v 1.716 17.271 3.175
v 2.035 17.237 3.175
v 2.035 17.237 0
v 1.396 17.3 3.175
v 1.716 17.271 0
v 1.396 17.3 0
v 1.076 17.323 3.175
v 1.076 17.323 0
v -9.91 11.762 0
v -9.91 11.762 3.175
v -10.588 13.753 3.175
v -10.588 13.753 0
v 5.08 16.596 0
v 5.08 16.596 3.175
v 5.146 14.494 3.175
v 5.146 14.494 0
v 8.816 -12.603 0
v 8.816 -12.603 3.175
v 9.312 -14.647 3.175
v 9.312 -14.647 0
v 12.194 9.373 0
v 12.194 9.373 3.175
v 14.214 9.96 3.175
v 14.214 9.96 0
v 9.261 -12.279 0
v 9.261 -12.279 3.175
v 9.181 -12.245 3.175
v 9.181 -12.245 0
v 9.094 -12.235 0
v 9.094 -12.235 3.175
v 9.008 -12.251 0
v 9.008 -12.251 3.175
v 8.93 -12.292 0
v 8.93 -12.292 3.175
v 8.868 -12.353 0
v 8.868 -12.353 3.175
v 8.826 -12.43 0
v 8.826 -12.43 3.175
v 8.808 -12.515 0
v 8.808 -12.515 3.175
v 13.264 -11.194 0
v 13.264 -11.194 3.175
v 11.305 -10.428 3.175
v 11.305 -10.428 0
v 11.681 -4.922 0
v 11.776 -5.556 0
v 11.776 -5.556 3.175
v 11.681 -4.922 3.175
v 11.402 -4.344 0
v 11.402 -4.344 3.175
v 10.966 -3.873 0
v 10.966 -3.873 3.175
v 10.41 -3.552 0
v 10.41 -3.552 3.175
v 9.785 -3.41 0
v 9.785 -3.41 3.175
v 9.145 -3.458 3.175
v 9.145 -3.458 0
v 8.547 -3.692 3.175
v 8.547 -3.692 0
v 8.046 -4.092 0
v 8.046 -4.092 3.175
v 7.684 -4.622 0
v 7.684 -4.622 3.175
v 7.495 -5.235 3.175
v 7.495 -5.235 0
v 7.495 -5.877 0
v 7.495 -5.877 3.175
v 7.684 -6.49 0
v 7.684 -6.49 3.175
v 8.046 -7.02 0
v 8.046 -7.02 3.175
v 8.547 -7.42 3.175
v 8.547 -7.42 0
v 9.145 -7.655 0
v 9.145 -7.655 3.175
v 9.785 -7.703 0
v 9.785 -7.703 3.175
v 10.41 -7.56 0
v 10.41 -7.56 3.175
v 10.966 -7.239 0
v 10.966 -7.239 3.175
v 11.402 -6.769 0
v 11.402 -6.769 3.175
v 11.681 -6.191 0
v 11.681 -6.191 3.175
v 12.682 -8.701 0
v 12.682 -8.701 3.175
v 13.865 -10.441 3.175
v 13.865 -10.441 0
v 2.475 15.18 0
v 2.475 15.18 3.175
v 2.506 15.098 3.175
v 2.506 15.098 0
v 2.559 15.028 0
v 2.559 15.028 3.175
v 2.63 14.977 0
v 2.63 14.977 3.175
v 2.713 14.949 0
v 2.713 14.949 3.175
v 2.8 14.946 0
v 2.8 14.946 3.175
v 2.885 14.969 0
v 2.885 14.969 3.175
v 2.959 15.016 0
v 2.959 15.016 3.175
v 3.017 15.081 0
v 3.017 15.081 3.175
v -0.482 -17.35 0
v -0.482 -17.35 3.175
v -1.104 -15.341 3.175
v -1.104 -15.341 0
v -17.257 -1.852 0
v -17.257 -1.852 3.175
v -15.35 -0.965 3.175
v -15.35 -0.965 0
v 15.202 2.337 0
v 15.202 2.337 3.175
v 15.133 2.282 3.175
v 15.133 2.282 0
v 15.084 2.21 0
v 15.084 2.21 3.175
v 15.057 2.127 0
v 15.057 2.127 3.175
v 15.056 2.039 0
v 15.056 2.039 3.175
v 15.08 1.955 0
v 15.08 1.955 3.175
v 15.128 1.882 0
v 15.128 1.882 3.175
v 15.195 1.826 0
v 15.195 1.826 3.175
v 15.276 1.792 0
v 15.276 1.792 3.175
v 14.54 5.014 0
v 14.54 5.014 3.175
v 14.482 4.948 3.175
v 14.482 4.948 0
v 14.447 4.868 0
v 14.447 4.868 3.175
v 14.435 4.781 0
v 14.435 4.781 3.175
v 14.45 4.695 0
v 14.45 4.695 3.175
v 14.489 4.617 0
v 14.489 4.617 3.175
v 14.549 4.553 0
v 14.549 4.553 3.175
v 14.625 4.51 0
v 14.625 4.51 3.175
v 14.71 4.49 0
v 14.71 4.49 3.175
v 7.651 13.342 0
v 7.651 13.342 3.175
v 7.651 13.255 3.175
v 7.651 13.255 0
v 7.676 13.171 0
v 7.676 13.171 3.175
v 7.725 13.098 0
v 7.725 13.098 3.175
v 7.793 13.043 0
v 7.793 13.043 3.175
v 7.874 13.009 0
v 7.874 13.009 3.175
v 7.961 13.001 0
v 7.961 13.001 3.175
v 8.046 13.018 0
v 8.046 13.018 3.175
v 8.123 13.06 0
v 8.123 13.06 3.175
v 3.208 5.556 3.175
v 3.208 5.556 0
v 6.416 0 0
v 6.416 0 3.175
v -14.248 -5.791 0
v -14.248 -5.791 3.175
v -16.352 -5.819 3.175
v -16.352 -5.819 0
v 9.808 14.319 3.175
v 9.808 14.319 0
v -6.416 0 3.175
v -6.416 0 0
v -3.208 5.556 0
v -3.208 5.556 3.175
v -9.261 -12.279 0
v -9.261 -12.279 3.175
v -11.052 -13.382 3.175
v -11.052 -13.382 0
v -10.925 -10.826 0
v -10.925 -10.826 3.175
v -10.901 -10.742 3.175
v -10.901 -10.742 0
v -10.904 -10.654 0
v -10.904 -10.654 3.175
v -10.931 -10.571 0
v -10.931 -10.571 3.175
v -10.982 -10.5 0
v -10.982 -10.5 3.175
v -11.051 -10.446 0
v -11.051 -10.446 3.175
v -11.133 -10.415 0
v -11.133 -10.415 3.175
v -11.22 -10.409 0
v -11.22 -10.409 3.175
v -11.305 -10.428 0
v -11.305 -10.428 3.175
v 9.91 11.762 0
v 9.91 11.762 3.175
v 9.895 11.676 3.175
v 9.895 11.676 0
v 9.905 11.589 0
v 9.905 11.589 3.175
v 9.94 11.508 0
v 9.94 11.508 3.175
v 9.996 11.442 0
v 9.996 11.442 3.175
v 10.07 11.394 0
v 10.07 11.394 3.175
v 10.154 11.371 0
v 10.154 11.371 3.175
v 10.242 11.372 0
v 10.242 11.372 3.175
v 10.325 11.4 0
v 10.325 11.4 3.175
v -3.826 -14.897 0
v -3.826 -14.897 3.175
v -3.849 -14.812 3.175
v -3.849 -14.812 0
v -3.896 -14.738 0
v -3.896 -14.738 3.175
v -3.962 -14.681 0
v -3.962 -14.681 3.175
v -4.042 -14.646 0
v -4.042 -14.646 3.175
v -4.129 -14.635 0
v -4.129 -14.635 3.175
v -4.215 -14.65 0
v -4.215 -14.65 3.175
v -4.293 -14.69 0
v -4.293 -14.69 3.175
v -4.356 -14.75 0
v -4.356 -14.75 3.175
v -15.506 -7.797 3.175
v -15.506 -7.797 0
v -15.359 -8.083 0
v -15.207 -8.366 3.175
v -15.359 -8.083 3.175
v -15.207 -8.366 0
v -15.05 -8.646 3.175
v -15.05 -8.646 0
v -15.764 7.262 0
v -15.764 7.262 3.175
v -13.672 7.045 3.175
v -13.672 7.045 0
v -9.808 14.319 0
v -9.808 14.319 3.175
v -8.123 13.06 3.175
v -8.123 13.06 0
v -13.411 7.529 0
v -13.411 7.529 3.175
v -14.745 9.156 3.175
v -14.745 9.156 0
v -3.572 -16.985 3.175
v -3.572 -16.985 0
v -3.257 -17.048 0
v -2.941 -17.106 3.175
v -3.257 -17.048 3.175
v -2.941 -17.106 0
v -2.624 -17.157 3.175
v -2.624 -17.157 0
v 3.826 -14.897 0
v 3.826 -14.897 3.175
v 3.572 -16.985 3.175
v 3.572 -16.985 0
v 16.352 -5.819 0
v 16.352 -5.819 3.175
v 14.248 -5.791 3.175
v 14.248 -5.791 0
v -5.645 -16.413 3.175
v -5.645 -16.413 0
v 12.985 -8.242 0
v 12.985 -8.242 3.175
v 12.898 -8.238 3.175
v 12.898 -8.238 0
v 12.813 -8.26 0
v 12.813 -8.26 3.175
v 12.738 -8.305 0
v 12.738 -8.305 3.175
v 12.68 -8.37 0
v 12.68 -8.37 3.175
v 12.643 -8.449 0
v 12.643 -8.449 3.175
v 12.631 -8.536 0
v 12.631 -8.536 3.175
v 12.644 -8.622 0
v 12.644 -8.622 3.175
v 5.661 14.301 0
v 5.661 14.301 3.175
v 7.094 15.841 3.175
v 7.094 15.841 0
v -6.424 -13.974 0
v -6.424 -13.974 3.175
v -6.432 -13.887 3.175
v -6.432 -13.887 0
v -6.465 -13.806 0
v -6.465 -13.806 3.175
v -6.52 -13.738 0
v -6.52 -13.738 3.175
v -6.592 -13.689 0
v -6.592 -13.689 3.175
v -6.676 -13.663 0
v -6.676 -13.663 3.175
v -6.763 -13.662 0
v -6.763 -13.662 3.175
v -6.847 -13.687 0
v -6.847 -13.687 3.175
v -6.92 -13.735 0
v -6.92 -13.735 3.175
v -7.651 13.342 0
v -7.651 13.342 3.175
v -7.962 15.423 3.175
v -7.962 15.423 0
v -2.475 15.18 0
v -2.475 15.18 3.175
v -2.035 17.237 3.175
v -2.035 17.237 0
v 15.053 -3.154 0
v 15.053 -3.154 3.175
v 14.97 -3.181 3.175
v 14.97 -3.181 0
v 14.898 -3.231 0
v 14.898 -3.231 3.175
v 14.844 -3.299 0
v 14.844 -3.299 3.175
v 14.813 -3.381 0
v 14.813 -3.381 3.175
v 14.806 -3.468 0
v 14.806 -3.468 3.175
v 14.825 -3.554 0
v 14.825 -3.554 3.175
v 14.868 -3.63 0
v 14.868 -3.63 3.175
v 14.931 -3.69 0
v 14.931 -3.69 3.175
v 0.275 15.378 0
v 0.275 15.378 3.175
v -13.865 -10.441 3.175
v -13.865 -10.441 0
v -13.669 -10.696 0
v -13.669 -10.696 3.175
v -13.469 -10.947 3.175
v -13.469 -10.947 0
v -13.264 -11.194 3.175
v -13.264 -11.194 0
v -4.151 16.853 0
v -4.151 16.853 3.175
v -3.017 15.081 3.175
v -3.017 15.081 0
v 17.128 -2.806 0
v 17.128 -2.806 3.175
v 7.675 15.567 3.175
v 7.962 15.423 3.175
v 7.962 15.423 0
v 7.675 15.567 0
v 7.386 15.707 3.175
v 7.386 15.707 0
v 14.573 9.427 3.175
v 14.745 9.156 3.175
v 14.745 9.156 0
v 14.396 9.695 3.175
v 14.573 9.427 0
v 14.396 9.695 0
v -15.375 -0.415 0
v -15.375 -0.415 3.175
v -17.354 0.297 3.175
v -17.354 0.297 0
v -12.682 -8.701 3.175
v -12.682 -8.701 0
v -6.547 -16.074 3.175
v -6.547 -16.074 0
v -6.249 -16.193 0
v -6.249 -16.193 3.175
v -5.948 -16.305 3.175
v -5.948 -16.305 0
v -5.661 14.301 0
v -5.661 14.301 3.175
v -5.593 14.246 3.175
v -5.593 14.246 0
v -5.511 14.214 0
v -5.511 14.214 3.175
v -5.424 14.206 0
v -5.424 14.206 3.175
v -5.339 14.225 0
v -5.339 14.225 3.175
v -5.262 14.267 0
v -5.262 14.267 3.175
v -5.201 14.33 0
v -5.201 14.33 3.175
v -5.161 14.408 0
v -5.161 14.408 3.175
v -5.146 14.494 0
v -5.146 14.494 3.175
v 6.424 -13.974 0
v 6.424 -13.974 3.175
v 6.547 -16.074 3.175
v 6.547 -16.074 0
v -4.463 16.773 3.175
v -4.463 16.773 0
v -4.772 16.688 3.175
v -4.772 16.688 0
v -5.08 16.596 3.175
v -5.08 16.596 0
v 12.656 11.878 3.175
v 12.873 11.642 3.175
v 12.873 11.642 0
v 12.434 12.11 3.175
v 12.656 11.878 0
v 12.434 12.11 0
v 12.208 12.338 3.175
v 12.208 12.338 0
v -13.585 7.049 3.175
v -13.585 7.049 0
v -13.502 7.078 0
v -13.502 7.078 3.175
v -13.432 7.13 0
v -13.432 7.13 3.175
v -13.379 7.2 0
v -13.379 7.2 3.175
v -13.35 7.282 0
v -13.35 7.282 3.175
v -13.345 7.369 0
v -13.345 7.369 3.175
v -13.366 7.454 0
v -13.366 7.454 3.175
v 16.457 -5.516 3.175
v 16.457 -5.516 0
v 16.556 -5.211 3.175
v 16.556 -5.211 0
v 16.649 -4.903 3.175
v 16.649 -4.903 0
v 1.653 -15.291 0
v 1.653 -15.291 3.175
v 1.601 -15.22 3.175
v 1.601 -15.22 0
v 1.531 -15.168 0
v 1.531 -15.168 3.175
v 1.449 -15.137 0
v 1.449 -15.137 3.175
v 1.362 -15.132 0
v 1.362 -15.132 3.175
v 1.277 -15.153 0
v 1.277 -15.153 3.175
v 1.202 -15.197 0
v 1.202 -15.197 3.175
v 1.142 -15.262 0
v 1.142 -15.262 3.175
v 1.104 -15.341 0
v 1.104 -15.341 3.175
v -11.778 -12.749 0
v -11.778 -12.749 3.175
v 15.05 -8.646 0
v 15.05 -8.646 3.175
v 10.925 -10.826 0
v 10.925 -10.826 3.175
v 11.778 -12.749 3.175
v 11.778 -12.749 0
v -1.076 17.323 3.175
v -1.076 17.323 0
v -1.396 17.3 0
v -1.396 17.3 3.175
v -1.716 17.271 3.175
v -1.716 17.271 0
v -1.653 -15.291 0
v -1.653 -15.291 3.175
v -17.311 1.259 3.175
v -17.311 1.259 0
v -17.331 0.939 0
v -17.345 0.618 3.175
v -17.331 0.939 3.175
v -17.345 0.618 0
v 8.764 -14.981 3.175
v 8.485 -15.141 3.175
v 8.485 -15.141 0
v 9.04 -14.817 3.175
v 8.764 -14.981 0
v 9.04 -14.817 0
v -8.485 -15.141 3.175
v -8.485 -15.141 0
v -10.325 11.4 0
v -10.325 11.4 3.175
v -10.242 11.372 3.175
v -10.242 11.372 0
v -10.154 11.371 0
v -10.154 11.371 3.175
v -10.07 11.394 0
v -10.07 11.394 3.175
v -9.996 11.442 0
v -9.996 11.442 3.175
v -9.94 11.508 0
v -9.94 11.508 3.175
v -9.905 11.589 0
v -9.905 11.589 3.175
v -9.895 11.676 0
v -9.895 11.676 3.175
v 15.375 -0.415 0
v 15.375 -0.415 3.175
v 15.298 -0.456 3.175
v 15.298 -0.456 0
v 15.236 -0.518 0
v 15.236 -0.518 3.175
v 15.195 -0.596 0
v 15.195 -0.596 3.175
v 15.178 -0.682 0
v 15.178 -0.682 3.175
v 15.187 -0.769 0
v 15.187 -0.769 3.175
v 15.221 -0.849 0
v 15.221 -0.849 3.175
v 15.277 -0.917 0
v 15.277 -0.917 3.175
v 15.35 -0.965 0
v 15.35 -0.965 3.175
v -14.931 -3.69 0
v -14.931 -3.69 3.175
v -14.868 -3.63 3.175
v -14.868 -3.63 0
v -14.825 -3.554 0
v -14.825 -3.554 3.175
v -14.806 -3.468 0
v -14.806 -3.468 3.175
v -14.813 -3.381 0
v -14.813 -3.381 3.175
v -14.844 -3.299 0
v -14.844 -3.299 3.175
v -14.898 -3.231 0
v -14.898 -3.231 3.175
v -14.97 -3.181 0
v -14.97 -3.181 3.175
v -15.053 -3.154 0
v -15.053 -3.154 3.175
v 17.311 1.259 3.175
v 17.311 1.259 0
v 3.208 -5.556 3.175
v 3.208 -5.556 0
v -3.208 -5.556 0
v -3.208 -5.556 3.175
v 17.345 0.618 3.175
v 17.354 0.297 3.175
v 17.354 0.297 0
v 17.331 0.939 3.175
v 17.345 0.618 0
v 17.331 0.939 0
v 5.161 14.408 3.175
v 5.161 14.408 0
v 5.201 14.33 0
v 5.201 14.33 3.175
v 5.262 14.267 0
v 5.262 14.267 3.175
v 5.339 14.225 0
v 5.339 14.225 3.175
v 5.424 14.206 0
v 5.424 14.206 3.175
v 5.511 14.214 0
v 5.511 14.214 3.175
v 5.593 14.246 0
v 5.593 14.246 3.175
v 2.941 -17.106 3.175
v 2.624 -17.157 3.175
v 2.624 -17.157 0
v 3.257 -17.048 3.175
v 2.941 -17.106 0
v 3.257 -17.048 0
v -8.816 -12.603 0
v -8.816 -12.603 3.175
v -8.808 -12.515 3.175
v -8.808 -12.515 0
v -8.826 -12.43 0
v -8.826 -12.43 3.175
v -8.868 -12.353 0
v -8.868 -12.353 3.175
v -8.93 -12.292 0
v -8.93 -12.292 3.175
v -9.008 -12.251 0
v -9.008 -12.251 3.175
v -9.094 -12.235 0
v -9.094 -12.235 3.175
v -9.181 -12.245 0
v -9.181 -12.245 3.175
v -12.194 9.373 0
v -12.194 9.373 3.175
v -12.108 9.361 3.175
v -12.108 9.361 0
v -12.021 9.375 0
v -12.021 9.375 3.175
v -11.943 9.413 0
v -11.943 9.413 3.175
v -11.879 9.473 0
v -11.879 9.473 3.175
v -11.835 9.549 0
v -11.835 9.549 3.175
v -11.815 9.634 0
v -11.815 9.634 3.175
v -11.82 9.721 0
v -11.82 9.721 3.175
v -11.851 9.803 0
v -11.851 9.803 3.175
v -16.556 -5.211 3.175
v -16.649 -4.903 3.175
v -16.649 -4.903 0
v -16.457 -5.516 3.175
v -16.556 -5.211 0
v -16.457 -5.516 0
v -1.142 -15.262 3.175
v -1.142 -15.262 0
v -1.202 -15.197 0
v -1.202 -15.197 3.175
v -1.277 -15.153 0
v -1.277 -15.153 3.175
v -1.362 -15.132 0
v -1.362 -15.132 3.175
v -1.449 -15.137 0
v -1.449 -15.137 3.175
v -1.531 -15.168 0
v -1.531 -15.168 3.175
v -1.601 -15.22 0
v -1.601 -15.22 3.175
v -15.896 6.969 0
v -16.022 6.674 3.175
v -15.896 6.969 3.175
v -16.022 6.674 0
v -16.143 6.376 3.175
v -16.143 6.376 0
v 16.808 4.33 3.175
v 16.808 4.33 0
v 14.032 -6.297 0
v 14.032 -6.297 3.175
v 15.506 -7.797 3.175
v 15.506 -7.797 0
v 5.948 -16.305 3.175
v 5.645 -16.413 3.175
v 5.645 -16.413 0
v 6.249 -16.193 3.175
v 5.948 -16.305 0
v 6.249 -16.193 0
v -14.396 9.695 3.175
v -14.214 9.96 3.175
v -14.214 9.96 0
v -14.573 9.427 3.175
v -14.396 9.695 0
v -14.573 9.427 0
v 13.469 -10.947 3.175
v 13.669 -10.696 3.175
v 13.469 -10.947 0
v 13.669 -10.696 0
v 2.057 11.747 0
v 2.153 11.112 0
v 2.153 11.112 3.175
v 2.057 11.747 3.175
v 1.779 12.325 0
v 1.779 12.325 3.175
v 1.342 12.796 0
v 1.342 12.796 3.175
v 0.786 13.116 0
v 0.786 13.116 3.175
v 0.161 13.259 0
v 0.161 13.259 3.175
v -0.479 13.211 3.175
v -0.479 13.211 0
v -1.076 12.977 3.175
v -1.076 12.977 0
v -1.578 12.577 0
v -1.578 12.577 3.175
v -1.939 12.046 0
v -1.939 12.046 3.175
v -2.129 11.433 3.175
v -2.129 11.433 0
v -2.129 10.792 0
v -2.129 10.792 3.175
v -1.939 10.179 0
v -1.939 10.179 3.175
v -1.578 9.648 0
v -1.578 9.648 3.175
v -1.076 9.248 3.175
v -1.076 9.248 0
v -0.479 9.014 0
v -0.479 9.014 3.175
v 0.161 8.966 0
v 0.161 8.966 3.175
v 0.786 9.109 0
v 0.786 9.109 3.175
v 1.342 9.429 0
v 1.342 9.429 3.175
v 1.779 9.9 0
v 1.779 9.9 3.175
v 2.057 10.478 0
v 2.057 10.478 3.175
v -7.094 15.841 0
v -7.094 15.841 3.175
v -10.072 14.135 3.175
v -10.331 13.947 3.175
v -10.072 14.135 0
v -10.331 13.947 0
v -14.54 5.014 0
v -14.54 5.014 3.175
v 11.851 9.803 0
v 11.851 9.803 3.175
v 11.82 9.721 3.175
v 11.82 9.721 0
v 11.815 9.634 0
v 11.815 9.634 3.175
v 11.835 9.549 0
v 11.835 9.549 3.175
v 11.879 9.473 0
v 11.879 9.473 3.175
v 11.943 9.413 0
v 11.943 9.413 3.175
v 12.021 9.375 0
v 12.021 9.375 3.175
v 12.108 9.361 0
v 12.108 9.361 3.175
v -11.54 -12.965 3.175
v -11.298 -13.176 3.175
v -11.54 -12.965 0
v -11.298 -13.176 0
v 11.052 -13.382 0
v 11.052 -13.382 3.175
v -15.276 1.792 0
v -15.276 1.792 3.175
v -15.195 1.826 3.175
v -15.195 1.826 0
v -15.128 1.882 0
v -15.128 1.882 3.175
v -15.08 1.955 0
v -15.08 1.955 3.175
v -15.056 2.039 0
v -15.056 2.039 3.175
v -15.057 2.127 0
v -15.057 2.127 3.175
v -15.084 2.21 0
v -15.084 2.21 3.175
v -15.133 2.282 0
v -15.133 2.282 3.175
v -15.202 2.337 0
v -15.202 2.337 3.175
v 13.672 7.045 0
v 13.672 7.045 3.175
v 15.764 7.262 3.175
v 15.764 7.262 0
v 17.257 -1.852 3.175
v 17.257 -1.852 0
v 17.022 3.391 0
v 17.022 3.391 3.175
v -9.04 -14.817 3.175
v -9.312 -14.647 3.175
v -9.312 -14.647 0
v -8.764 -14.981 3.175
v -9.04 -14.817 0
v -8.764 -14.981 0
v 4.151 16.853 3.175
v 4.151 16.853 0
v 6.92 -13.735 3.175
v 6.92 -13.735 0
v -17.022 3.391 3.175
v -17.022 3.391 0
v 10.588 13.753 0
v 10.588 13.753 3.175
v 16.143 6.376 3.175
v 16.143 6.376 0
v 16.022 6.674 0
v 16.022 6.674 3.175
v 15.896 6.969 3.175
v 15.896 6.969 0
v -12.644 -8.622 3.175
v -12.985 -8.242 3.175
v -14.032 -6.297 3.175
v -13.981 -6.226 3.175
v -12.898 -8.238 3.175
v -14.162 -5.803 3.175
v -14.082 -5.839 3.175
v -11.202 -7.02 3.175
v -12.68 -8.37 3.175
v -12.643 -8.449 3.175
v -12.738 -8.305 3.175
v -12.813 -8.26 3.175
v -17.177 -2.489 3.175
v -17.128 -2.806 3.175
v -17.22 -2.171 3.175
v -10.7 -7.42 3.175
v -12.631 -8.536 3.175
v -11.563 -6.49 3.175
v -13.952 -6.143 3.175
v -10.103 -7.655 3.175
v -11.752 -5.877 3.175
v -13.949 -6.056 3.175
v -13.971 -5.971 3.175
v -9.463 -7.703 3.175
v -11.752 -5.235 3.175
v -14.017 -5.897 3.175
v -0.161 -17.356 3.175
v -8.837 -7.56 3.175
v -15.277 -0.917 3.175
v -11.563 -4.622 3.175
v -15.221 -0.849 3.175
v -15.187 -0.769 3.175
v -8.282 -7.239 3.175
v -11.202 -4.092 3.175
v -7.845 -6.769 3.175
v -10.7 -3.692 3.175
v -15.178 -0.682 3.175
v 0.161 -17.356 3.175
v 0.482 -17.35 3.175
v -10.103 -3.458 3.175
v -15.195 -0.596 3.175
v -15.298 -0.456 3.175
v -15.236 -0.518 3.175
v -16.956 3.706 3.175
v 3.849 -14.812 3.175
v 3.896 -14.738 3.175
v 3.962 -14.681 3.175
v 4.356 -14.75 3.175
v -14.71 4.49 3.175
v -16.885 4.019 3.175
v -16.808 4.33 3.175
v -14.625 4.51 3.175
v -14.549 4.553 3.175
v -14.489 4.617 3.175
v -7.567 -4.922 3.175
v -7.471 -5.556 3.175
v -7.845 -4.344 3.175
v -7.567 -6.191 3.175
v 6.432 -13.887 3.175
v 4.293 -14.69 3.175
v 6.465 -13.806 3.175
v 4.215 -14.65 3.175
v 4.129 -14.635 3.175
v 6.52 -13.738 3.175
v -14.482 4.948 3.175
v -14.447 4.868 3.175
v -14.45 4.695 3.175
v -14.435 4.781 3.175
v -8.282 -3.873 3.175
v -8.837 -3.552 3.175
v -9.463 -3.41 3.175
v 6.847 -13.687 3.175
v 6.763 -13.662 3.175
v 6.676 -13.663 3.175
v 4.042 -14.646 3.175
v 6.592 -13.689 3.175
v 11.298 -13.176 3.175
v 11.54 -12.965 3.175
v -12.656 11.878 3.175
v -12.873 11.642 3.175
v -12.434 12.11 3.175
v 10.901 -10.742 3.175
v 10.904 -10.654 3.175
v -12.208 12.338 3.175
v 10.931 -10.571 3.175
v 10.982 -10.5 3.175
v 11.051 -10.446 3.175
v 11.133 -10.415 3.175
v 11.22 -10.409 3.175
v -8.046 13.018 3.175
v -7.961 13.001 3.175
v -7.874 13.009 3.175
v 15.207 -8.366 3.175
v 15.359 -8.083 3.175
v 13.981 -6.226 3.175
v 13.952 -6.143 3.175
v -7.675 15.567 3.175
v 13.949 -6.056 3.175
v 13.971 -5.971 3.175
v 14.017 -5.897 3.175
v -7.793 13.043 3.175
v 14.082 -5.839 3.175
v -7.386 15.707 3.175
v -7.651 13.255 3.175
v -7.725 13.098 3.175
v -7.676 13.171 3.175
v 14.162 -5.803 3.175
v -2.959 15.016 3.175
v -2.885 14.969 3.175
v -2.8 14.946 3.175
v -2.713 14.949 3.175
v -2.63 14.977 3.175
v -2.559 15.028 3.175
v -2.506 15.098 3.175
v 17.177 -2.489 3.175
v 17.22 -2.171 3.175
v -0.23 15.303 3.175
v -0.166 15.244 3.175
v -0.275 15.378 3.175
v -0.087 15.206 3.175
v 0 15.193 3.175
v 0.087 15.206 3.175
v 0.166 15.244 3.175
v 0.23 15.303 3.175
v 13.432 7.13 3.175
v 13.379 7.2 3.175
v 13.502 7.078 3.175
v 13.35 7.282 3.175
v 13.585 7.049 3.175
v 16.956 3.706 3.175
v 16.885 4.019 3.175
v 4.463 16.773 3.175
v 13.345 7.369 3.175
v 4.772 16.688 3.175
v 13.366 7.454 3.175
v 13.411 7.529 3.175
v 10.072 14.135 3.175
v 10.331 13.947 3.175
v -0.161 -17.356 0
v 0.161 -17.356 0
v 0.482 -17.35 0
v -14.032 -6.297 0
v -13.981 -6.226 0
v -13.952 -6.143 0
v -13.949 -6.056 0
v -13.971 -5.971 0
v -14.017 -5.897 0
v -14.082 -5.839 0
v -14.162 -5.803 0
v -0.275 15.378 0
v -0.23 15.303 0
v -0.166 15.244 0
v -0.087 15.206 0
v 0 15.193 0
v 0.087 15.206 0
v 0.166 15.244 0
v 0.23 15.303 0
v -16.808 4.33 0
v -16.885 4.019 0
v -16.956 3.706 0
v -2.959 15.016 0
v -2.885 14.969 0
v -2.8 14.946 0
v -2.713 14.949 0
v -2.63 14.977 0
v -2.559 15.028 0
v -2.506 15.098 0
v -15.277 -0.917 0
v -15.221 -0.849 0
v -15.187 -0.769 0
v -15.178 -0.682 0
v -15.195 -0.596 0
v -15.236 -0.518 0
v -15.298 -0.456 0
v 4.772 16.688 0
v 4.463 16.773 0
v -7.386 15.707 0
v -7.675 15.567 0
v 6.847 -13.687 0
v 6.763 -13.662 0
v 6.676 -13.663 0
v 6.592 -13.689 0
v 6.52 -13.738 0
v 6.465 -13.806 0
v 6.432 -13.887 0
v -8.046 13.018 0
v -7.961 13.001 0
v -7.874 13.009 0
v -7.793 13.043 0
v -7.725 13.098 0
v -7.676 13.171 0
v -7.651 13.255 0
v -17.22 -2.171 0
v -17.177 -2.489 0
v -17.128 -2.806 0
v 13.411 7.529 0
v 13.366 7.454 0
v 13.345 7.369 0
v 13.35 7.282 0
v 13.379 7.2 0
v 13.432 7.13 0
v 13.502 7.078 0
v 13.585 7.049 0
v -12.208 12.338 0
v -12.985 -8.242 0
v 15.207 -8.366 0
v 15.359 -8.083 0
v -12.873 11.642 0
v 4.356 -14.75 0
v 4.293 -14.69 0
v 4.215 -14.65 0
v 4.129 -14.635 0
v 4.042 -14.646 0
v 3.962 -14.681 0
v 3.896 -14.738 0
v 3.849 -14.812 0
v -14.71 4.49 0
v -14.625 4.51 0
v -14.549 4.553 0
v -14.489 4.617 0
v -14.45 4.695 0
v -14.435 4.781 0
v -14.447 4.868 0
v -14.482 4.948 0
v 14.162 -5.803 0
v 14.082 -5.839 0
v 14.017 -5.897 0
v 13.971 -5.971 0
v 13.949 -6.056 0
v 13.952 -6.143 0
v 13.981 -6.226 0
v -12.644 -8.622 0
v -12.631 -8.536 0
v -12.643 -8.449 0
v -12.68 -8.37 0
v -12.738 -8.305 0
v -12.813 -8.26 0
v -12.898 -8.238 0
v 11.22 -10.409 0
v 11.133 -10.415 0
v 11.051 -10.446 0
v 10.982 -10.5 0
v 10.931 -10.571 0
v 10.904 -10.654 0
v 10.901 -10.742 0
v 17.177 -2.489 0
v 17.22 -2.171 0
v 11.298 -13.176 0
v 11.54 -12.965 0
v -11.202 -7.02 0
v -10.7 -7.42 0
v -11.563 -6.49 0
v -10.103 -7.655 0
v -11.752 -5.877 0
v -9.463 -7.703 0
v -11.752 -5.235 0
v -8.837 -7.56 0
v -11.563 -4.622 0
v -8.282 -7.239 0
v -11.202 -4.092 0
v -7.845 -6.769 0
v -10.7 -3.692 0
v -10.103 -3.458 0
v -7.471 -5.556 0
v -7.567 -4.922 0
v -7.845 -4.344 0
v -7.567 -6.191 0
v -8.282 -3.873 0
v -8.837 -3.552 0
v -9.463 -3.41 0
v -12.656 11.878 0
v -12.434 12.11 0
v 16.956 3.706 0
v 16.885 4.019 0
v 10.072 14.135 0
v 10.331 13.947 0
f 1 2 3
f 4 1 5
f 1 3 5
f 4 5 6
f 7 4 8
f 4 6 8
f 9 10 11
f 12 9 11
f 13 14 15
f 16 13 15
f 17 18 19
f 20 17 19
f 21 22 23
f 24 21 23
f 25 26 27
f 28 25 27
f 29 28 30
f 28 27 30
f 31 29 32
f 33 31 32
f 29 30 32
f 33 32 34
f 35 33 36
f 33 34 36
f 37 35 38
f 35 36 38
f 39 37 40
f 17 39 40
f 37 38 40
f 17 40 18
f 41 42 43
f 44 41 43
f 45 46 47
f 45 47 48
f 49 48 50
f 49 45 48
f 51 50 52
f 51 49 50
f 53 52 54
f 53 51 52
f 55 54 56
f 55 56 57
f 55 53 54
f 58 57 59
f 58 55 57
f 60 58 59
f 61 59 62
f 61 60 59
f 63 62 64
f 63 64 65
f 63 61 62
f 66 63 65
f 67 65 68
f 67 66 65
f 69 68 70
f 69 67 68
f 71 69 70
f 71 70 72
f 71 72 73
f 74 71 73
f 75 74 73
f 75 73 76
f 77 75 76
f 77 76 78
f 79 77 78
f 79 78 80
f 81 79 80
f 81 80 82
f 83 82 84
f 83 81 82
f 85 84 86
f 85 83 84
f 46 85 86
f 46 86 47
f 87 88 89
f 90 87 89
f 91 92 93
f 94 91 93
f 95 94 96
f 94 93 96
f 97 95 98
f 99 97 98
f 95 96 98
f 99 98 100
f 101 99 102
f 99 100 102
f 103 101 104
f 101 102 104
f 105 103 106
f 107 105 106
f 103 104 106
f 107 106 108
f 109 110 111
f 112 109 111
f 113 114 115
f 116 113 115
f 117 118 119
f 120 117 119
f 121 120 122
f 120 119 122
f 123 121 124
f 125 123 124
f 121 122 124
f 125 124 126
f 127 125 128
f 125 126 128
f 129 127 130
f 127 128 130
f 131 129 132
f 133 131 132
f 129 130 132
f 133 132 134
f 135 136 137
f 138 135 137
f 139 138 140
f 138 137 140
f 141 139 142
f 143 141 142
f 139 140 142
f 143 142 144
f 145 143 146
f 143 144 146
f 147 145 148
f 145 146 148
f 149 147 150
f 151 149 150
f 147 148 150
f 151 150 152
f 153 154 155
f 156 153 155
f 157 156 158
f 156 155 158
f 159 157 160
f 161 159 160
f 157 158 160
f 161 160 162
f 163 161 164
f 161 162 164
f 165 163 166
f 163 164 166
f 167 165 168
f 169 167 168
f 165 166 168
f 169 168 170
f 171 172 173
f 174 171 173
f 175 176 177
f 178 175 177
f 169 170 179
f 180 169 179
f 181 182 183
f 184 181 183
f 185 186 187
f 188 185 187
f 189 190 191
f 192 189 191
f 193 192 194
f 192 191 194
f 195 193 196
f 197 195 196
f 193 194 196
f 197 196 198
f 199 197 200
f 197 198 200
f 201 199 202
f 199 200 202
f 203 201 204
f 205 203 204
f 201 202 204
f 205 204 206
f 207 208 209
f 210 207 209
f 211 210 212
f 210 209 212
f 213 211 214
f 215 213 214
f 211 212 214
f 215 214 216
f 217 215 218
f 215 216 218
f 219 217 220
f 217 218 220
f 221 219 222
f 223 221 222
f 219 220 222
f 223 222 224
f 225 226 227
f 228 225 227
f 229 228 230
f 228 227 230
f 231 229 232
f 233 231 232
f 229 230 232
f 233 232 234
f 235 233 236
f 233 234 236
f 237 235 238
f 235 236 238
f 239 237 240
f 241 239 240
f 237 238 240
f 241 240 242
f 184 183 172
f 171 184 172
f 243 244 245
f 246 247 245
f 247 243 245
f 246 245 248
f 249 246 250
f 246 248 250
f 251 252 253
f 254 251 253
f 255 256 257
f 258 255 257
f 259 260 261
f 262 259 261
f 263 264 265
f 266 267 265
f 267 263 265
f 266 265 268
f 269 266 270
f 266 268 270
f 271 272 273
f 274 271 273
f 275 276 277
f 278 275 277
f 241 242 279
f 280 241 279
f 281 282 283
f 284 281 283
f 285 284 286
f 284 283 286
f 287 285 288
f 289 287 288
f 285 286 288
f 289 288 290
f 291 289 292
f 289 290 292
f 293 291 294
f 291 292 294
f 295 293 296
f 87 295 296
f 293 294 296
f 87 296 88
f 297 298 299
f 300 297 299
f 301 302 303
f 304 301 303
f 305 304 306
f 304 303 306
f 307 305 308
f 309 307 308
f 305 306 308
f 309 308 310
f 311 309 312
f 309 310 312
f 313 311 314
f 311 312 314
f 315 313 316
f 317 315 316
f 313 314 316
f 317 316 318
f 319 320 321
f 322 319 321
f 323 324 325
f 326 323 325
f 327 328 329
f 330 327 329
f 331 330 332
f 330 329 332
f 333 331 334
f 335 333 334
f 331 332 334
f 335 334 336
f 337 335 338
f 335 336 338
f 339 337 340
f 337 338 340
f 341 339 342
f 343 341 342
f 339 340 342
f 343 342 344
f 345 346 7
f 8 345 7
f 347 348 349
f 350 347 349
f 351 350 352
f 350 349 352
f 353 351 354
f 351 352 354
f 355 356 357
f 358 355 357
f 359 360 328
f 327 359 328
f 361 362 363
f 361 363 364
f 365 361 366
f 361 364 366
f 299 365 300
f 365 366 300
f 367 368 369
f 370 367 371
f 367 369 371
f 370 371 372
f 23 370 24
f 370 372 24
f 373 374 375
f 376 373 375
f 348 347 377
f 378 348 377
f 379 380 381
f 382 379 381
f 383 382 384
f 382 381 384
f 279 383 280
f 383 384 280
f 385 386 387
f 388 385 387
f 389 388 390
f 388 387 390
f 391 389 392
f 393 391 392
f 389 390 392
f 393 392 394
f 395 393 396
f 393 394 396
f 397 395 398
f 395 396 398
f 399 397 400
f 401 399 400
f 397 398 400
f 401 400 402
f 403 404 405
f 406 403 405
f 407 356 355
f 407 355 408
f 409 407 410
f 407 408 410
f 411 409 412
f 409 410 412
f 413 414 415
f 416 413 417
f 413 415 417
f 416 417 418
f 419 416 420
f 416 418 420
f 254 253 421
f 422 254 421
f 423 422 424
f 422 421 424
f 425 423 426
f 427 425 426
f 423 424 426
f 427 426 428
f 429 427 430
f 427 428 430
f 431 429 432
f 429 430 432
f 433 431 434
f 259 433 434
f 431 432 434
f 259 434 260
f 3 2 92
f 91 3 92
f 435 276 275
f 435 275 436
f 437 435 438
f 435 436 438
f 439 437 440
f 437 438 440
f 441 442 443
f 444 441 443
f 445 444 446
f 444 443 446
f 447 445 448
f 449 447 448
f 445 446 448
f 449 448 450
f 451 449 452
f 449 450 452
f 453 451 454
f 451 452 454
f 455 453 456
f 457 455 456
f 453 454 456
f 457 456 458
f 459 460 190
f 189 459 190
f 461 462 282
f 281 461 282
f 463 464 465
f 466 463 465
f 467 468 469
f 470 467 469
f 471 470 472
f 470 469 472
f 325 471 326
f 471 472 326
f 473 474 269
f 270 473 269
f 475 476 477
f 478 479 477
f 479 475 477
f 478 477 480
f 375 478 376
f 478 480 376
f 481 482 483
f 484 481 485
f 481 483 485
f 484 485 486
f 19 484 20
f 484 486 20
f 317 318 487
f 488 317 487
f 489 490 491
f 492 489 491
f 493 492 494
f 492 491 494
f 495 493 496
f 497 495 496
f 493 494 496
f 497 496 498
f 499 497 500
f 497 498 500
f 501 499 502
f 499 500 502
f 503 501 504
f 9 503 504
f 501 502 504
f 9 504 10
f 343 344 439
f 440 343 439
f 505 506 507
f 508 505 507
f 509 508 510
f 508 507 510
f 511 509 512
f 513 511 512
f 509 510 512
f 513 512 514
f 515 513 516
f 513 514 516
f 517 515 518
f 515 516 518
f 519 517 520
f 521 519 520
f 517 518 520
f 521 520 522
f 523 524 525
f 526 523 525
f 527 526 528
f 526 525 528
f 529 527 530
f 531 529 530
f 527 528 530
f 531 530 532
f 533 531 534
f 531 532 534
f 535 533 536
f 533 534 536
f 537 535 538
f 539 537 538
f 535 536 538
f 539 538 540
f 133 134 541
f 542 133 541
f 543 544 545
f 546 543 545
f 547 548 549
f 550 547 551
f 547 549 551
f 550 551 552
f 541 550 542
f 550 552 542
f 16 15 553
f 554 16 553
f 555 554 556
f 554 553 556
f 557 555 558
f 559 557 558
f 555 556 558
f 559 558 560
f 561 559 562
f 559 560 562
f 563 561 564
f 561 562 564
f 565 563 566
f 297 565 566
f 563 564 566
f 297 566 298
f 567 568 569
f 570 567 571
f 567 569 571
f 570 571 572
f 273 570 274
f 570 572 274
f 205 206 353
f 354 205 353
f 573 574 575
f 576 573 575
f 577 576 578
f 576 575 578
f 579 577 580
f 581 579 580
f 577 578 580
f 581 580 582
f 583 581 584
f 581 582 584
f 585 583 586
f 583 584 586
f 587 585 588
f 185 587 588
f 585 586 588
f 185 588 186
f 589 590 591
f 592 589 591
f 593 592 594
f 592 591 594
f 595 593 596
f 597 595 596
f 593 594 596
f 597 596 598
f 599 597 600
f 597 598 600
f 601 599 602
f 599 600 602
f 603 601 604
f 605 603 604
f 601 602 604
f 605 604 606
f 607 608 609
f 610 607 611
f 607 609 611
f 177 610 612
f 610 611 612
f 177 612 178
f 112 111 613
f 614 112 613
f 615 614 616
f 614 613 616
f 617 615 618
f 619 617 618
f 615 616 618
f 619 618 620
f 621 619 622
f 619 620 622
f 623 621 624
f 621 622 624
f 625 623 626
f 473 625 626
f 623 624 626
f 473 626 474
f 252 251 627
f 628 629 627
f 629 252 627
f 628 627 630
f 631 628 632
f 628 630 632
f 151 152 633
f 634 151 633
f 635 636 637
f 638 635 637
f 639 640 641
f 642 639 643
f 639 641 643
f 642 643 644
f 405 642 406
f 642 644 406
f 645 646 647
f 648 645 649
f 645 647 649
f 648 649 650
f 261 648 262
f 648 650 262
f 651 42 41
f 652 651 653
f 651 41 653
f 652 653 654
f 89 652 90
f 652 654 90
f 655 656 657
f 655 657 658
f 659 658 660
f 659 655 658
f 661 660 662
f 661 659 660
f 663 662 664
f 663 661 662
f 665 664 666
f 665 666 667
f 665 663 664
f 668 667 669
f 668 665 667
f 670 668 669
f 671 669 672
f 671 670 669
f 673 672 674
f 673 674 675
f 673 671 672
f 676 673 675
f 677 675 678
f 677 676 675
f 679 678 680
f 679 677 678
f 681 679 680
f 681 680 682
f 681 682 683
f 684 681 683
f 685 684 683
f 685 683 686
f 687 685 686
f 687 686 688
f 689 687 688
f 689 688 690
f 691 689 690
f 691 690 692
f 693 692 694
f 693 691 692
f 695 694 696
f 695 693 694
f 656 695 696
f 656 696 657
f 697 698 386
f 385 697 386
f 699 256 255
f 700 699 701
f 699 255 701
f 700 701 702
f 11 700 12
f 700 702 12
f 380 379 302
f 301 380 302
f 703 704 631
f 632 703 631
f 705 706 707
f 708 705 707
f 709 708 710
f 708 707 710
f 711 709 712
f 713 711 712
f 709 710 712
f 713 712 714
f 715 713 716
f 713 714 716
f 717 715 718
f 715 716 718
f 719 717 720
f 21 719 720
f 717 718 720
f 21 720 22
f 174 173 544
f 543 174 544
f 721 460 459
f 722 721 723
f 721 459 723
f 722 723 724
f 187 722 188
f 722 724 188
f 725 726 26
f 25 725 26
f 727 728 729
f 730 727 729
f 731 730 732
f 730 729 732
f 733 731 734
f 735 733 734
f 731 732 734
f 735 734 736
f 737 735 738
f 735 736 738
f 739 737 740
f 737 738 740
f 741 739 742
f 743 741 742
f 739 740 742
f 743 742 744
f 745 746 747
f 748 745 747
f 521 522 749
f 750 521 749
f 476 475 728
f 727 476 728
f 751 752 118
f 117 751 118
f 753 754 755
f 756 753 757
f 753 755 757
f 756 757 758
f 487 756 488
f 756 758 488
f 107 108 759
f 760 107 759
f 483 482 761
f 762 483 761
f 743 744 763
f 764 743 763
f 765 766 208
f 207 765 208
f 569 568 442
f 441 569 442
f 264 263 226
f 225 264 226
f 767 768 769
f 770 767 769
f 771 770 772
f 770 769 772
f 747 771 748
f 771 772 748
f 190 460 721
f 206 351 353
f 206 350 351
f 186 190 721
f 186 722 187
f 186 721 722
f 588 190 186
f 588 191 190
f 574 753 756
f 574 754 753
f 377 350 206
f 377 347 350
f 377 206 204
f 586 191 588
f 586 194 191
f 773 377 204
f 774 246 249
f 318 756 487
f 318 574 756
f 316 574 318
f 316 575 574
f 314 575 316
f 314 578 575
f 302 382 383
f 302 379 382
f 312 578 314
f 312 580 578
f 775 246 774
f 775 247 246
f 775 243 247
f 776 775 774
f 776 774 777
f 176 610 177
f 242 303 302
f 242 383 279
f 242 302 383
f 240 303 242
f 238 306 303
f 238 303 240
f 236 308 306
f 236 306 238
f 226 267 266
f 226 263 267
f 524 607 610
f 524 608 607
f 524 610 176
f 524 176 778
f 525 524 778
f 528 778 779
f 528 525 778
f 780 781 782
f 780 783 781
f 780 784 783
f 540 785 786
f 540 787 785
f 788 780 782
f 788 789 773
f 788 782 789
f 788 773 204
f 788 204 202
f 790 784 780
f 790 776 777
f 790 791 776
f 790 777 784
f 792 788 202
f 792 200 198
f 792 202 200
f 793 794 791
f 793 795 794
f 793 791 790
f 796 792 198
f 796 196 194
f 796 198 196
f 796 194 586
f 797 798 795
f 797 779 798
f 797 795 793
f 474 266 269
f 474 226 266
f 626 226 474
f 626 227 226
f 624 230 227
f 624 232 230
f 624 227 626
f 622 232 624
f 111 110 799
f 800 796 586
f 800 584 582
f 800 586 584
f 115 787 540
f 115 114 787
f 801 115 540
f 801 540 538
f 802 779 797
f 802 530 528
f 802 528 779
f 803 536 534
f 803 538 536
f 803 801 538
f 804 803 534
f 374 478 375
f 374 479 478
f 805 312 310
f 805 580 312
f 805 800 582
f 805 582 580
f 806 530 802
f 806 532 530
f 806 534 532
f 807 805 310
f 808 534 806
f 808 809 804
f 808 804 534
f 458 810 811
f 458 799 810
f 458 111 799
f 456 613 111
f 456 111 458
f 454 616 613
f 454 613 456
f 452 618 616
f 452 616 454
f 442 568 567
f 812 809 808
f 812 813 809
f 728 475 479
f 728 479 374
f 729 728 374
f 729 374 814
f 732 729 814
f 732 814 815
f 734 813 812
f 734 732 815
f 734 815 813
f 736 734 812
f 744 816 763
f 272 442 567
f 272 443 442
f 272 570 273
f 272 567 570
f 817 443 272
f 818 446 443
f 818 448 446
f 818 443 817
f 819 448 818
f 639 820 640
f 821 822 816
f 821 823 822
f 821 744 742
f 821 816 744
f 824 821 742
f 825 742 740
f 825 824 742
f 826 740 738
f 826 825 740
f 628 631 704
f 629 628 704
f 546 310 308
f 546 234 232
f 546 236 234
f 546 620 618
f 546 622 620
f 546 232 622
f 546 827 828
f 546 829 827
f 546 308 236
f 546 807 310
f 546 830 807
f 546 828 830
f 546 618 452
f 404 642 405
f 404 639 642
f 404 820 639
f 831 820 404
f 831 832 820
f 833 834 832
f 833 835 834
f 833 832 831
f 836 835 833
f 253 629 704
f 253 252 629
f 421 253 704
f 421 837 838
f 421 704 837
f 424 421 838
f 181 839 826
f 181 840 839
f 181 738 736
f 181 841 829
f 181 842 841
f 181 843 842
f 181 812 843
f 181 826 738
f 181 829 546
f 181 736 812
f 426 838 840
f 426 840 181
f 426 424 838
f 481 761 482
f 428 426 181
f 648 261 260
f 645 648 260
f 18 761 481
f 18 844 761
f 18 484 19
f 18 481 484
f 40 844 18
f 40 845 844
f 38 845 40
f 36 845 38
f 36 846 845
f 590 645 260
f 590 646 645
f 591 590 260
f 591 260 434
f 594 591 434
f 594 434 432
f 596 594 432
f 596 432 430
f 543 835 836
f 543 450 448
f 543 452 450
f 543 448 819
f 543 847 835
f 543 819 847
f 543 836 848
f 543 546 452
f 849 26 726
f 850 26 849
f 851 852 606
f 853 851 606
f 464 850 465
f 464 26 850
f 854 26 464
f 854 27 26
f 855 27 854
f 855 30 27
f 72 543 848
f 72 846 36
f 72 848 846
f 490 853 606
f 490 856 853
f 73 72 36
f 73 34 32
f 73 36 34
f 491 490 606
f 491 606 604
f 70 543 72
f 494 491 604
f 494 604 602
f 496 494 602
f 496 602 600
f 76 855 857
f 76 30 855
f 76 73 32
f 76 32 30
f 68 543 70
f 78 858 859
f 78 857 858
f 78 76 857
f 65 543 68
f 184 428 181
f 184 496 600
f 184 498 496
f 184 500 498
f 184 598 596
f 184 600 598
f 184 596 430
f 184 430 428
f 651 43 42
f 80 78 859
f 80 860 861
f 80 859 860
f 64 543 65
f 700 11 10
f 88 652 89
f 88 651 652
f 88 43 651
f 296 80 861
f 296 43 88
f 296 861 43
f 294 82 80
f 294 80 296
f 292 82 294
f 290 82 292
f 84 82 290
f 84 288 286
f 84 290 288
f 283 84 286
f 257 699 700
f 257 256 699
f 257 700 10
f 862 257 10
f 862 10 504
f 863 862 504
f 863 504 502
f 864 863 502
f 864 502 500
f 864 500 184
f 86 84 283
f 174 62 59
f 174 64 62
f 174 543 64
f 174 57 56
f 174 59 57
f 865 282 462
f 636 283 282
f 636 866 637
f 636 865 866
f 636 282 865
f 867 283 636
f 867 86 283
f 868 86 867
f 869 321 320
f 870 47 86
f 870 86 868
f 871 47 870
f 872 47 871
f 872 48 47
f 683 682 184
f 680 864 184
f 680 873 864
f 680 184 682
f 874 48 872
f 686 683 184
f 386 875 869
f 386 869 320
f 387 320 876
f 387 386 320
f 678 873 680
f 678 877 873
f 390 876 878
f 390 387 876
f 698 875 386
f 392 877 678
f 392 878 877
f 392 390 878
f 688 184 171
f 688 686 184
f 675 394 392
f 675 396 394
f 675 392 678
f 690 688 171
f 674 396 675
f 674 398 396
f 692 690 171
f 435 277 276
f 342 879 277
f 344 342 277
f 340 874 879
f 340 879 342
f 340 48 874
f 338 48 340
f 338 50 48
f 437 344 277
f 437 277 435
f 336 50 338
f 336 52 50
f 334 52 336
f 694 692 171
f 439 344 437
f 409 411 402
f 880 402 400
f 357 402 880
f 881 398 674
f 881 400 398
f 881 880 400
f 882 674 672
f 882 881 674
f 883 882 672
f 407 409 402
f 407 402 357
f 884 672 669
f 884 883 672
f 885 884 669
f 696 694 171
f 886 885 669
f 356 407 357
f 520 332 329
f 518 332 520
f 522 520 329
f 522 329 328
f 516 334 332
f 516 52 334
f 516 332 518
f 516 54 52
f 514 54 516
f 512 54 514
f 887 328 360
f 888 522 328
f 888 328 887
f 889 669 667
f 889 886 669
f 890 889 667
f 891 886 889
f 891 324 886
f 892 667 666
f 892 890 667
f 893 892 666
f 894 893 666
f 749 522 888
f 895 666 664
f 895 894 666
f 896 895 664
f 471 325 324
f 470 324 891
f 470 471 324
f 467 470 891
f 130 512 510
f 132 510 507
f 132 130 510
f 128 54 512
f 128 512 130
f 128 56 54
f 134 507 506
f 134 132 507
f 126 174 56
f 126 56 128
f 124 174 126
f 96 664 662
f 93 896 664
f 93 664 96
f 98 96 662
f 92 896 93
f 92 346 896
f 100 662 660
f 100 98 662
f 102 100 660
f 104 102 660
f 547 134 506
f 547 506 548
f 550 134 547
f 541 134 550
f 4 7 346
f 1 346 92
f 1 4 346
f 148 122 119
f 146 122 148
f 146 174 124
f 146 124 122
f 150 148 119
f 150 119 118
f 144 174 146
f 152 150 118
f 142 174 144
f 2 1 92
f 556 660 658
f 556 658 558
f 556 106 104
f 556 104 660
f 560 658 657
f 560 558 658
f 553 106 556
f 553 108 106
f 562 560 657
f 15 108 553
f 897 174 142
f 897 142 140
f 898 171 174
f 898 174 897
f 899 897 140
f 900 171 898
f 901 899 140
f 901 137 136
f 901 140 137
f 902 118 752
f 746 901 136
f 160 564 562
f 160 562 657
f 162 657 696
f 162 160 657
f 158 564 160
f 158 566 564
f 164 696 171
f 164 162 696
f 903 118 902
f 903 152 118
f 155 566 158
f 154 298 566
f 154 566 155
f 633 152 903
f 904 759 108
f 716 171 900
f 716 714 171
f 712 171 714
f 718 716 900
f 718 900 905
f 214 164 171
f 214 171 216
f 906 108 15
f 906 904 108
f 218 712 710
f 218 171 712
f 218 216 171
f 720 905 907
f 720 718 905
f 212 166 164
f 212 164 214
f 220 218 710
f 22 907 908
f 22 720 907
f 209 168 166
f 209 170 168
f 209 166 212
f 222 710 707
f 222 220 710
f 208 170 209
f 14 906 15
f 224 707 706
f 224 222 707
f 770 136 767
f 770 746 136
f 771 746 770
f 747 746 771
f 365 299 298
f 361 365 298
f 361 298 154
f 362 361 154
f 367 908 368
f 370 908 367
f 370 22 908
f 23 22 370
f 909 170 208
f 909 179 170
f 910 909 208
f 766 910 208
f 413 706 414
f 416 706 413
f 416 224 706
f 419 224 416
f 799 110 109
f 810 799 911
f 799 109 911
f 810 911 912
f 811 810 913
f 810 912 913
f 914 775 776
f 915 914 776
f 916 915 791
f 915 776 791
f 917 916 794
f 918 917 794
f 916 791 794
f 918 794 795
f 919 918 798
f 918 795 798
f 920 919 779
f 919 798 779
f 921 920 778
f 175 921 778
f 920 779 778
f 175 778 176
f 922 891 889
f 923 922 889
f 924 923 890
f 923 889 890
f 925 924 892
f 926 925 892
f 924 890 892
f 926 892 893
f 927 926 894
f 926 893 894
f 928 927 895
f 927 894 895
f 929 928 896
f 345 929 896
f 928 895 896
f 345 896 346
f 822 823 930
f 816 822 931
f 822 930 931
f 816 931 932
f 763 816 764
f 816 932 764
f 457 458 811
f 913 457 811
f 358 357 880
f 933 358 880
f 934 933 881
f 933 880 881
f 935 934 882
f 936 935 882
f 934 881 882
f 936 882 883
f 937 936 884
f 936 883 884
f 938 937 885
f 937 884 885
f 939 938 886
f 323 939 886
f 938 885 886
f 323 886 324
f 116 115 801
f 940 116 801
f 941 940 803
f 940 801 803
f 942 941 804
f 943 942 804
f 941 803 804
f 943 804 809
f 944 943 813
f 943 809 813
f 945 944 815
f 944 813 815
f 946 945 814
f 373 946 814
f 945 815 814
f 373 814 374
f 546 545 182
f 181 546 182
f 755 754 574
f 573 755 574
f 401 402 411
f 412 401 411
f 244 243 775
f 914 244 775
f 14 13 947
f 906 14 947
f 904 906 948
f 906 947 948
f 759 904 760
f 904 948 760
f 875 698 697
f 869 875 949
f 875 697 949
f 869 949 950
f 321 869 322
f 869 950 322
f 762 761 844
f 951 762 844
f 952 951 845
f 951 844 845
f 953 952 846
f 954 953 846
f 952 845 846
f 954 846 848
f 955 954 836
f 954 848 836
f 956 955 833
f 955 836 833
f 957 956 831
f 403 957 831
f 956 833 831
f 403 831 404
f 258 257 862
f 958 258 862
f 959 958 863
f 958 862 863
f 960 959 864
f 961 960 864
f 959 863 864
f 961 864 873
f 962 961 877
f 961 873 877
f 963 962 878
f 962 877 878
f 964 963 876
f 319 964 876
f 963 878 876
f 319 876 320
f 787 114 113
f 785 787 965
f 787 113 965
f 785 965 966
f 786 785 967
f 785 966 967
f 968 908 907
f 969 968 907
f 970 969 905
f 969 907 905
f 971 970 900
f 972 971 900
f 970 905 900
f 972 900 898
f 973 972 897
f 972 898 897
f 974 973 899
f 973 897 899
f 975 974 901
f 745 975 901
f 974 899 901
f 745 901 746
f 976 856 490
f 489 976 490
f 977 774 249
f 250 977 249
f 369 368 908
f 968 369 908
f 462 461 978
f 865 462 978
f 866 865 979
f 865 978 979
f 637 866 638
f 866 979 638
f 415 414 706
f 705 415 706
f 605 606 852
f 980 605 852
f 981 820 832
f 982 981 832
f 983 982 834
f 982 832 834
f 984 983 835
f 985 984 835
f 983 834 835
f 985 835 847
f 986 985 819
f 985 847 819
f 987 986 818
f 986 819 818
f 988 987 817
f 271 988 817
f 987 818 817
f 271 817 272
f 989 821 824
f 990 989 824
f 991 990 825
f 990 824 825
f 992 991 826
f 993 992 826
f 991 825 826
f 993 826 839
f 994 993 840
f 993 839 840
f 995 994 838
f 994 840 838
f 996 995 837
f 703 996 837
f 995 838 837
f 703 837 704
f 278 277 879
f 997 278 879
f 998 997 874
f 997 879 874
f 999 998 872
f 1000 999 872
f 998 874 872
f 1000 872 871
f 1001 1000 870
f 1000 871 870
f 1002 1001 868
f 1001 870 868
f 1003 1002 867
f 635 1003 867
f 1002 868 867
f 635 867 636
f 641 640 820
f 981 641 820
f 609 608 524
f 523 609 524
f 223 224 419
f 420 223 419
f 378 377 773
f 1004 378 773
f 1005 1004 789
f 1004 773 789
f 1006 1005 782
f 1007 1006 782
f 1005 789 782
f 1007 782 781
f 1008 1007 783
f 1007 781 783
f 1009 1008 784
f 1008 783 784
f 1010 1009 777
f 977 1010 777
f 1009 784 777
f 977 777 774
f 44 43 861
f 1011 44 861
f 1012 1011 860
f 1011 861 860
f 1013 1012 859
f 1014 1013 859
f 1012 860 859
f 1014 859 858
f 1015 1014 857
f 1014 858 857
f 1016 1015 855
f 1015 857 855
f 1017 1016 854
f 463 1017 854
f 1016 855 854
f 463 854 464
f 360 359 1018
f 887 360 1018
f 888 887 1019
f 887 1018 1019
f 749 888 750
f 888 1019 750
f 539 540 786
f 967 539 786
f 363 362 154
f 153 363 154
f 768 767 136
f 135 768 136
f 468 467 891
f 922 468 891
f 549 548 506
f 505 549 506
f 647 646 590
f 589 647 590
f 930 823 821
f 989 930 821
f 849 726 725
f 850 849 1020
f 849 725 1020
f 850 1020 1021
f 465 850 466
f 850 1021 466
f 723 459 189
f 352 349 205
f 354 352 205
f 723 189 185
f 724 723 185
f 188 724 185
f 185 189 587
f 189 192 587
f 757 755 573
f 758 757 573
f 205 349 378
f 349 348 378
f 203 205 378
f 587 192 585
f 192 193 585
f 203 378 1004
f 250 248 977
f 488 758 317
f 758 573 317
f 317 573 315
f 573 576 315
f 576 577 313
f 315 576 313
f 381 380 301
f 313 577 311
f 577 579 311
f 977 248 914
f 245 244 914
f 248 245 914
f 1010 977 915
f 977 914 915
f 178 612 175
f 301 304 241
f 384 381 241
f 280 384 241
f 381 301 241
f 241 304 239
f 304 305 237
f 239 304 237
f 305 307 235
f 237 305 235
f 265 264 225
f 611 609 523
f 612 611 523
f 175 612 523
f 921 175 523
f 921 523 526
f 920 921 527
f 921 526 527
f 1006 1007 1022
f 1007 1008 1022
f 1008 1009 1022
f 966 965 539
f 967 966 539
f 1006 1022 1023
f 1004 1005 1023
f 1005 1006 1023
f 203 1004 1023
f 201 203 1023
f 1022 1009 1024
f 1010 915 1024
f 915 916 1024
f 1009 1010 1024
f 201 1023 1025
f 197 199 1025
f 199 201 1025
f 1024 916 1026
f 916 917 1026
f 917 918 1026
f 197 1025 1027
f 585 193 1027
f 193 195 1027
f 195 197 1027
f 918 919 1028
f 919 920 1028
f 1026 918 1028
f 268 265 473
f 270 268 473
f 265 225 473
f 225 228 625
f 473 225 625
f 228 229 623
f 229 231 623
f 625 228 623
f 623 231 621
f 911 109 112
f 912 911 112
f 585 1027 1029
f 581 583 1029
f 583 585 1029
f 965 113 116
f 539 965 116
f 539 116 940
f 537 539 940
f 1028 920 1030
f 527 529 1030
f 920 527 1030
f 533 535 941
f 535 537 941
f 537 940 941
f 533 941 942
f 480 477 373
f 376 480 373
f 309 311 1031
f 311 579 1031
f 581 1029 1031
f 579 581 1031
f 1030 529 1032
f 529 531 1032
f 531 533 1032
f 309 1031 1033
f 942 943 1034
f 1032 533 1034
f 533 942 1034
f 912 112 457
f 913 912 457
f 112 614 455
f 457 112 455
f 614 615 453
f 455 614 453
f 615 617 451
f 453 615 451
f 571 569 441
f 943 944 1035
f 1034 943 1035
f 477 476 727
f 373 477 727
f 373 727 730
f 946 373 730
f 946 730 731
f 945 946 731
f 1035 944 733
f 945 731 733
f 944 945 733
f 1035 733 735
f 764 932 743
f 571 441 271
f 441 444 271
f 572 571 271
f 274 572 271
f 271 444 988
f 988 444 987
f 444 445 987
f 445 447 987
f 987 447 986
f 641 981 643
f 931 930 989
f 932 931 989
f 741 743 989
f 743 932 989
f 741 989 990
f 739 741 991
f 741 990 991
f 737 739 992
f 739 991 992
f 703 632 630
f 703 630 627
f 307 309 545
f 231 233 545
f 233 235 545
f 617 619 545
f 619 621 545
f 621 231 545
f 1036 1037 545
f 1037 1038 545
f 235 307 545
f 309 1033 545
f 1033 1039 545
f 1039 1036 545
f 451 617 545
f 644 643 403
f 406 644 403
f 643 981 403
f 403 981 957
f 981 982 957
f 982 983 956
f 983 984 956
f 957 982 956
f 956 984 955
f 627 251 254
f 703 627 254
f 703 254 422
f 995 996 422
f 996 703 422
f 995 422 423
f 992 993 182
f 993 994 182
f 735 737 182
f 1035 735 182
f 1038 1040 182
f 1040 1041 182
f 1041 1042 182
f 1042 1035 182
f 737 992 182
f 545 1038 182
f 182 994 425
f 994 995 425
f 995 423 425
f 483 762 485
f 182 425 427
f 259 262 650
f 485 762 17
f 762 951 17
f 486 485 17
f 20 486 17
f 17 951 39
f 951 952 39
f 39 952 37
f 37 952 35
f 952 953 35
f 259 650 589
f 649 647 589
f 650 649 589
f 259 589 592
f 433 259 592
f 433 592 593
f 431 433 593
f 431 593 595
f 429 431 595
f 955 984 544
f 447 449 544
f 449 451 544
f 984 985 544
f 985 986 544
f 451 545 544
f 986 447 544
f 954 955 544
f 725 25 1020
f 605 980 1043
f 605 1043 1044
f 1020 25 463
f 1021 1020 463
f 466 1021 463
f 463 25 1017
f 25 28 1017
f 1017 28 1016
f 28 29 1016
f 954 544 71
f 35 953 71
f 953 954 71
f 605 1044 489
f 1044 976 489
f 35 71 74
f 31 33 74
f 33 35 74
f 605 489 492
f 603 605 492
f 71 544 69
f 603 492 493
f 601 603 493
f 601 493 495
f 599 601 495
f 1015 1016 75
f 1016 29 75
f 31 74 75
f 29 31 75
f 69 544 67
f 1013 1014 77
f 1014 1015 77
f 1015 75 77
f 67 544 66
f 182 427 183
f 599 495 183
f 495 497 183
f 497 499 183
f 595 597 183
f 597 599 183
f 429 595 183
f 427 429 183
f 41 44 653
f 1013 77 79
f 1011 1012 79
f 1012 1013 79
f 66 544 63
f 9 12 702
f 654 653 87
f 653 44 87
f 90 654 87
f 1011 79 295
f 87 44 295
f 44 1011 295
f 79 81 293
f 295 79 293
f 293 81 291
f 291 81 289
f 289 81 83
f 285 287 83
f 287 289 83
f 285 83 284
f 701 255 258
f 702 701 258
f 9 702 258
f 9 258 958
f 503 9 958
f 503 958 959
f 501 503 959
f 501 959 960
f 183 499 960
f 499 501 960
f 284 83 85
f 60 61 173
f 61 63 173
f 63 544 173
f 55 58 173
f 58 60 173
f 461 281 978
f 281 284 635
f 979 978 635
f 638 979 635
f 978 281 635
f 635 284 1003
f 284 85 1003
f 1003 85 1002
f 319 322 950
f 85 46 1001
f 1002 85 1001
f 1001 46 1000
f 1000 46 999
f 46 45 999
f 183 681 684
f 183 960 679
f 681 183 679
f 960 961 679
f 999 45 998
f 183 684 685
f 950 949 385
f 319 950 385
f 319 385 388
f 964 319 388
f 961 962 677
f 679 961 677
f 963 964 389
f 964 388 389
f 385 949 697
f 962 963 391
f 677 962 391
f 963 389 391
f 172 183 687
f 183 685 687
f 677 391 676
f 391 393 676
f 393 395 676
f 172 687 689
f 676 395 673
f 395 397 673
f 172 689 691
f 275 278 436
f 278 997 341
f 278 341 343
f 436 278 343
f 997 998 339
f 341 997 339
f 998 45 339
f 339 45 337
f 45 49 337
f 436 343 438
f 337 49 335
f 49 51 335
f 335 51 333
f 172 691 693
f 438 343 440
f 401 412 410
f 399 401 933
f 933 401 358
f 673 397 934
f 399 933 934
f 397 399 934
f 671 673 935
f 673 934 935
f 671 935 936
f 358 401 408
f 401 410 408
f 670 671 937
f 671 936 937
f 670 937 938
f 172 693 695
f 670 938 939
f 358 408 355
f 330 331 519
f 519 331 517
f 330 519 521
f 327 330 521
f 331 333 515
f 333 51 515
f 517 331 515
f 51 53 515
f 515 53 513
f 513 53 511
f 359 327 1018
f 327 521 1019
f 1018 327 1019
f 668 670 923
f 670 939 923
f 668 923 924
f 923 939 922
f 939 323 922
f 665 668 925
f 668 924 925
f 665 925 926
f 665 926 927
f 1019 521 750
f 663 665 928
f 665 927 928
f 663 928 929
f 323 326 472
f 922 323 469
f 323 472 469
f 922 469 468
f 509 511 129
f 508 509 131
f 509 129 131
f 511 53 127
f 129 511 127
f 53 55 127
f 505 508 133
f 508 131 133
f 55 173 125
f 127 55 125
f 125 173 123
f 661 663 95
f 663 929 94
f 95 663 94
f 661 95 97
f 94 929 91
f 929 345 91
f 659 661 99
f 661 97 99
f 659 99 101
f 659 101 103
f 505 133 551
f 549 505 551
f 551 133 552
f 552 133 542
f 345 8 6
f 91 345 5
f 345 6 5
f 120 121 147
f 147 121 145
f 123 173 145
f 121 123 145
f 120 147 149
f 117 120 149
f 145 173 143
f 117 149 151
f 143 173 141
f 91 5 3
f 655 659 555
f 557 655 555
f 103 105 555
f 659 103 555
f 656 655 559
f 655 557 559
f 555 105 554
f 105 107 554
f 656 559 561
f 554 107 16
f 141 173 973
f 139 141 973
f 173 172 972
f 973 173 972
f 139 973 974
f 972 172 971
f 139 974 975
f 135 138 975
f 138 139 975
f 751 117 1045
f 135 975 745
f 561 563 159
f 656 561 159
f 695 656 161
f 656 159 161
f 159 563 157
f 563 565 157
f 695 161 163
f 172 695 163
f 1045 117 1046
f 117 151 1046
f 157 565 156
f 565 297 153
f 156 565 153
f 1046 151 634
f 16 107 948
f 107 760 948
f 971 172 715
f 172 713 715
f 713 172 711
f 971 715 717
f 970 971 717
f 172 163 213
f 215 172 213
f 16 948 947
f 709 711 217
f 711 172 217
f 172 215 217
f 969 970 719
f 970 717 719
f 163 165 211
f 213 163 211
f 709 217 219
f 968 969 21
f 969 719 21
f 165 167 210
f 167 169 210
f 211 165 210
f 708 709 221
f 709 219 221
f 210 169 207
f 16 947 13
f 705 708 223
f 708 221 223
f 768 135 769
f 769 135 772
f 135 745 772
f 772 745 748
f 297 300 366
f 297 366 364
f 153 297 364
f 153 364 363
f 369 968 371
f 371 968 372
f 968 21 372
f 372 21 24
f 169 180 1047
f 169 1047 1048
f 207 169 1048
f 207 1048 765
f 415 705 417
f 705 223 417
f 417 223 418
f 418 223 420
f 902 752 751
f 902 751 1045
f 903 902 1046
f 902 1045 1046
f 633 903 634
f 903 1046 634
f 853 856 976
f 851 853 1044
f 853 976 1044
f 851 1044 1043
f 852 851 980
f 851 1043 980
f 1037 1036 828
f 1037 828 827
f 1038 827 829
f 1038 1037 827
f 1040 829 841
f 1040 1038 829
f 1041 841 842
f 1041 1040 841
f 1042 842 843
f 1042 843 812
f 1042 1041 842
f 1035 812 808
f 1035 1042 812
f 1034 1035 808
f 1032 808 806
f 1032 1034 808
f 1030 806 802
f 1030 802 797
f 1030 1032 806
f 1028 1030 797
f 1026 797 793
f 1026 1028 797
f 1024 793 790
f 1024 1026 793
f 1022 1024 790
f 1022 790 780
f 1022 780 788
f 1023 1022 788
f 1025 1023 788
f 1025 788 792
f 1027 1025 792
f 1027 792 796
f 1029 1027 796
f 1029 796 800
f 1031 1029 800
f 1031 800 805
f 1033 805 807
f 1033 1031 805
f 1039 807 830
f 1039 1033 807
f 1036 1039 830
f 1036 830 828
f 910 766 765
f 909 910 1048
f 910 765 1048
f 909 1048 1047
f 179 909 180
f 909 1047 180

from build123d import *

# Parameters (mm, degrees)
F0_R            = 17.3565013667
F0_R_2          = 2.15265
F1_DEPTH        = 3.175
F3_DEPTH        = 3.175
F3_COPIES_COUNT = 35


# Not quite as in the source:
# - a pattern or mirror of a feature is missing from the dataset's text; its kind, count and spacing are read off the source's solid
# - a feature names something its author has since deleted; it is built from what else it names


with BuildPart() as f1:
    # F0 (on Top) → F1 (new body)
    with BuildSketch(Plane.XY):
        Circle(F0_R)
        with Locations((-9.6237072996, -5.55625)):
            Circle(F0_R_2, mode=Mode.SUBTRACT)
        with Locations((9.6237072996, -5.55625)):
            Circle(F0_R_2, mode=Mode.SUBTRACT)
        Polygon((6.4158048664, 0), (3.2079024332, -5.55625), (-3.2079024332, -5.55625), (-6.4158048664, 0), (-3.2079024332, 5.55625), (3.2079024332, 5.55625), align=None, mode=Mode.SUBTRACT)
        with Locations((0, 11.1125)):
            Circle(F0_R_2, mode=Mode.SUBTRACT)
    extrude(amount=F1_DEPTH)

    # F2 (on face) → F3 (cut, through all)
    with BuildSketch(Plane.XY.offset(3.175)):
        with BuildLine():
            Line((0.275157943, 15.3777549622), (1.0756124971, 17.3231405192))
            ThreePointArc((1.0756124971, 17.3231405192), (0, 17.3565013667), (-1.0756124971, 17.3231405192))
            Line((-1.0756124971, 17.3231405192), (-0.275157943, 15.3777549622))
            ThreePointArc((-0.275157943, 15.3777549622), (0, 15.1934323047), (0.275157943, 15.3777549622))
        make_face()
    f3 = extrude(amount=-F3_DEPTH, mode=Mode.SUBTRACT)

    # F3_copies: F3 ×35 about axis
    f3_copies_axis = Axis((0, 0, 0), (0, 0, 1))
    for i in range(1, F3_COPIES_COUNT):
        add(f3.rotate(f3_copies_axis, i * 360 / F3_COPIES_COUNT), mode=Mode.SUBTRACT)


solid = f1.part
